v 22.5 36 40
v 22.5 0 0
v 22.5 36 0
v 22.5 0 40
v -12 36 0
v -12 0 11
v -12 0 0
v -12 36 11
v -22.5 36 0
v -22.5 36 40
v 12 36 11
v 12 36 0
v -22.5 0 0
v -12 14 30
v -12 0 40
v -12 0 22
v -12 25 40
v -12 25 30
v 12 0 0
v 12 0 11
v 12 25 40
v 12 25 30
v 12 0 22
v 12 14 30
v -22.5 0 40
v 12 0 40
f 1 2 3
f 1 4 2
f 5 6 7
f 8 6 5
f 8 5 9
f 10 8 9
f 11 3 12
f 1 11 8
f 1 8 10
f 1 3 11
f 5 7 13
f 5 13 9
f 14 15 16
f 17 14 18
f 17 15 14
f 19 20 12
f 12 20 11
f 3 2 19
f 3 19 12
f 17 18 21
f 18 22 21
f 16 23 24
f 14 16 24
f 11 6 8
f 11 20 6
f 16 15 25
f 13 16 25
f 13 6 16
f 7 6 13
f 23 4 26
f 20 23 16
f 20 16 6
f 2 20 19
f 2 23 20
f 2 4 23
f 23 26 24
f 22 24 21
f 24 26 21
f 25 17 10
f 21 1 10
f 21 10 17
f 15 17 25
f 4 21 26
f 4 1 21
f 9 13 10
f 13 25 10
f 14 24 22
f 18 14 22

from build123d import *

# Parameters (mm, degrees)
F0_W     = 36
F0_H     = 11
F1_DEPTH = 22.5
F2_DEPTH = 12
F3_DEPTH = 12


with BuildPart() as f1:
    # F0 (on Right) → F1 (new body, symmetric)
    with BuildSketch(Plane.YZ):
        with Locations((18, 5.5)):
            Rectangle(F0_W, F0_H)
        Polygon((0, 22), (0, 11), (36, 11), (36, 40), (25, 40), (25, 30), (14, 30), align=None)
        Polygon((0, 40), (0, 22), (14, 30), (25, 30), (25, 40), align=None)
    extrude(amount=F1_DEPTH, both=True)

    # F0 (on Right) → F2 (cut, symmetric)
    with BuildSketch(Plane.YZ):
        with Locations((18, 5.5)):
            Rectangle(F0_W, F0_H)
    extrude(amount=F2_DEPTH, both=True, mode=Mode.SUBTRACT)

    # F0 (on Right) → F3 (cut, symmetric)
    with BuildSketch(Plane.YZ):
        Polygon((0, 40), (0, 22), (14, 30), (25, 30), (25, 40), align=None)
    extrude(amount=F3_DEPTH, both=True, mode=Mode.SUBTRACT)


solid = f1.part
